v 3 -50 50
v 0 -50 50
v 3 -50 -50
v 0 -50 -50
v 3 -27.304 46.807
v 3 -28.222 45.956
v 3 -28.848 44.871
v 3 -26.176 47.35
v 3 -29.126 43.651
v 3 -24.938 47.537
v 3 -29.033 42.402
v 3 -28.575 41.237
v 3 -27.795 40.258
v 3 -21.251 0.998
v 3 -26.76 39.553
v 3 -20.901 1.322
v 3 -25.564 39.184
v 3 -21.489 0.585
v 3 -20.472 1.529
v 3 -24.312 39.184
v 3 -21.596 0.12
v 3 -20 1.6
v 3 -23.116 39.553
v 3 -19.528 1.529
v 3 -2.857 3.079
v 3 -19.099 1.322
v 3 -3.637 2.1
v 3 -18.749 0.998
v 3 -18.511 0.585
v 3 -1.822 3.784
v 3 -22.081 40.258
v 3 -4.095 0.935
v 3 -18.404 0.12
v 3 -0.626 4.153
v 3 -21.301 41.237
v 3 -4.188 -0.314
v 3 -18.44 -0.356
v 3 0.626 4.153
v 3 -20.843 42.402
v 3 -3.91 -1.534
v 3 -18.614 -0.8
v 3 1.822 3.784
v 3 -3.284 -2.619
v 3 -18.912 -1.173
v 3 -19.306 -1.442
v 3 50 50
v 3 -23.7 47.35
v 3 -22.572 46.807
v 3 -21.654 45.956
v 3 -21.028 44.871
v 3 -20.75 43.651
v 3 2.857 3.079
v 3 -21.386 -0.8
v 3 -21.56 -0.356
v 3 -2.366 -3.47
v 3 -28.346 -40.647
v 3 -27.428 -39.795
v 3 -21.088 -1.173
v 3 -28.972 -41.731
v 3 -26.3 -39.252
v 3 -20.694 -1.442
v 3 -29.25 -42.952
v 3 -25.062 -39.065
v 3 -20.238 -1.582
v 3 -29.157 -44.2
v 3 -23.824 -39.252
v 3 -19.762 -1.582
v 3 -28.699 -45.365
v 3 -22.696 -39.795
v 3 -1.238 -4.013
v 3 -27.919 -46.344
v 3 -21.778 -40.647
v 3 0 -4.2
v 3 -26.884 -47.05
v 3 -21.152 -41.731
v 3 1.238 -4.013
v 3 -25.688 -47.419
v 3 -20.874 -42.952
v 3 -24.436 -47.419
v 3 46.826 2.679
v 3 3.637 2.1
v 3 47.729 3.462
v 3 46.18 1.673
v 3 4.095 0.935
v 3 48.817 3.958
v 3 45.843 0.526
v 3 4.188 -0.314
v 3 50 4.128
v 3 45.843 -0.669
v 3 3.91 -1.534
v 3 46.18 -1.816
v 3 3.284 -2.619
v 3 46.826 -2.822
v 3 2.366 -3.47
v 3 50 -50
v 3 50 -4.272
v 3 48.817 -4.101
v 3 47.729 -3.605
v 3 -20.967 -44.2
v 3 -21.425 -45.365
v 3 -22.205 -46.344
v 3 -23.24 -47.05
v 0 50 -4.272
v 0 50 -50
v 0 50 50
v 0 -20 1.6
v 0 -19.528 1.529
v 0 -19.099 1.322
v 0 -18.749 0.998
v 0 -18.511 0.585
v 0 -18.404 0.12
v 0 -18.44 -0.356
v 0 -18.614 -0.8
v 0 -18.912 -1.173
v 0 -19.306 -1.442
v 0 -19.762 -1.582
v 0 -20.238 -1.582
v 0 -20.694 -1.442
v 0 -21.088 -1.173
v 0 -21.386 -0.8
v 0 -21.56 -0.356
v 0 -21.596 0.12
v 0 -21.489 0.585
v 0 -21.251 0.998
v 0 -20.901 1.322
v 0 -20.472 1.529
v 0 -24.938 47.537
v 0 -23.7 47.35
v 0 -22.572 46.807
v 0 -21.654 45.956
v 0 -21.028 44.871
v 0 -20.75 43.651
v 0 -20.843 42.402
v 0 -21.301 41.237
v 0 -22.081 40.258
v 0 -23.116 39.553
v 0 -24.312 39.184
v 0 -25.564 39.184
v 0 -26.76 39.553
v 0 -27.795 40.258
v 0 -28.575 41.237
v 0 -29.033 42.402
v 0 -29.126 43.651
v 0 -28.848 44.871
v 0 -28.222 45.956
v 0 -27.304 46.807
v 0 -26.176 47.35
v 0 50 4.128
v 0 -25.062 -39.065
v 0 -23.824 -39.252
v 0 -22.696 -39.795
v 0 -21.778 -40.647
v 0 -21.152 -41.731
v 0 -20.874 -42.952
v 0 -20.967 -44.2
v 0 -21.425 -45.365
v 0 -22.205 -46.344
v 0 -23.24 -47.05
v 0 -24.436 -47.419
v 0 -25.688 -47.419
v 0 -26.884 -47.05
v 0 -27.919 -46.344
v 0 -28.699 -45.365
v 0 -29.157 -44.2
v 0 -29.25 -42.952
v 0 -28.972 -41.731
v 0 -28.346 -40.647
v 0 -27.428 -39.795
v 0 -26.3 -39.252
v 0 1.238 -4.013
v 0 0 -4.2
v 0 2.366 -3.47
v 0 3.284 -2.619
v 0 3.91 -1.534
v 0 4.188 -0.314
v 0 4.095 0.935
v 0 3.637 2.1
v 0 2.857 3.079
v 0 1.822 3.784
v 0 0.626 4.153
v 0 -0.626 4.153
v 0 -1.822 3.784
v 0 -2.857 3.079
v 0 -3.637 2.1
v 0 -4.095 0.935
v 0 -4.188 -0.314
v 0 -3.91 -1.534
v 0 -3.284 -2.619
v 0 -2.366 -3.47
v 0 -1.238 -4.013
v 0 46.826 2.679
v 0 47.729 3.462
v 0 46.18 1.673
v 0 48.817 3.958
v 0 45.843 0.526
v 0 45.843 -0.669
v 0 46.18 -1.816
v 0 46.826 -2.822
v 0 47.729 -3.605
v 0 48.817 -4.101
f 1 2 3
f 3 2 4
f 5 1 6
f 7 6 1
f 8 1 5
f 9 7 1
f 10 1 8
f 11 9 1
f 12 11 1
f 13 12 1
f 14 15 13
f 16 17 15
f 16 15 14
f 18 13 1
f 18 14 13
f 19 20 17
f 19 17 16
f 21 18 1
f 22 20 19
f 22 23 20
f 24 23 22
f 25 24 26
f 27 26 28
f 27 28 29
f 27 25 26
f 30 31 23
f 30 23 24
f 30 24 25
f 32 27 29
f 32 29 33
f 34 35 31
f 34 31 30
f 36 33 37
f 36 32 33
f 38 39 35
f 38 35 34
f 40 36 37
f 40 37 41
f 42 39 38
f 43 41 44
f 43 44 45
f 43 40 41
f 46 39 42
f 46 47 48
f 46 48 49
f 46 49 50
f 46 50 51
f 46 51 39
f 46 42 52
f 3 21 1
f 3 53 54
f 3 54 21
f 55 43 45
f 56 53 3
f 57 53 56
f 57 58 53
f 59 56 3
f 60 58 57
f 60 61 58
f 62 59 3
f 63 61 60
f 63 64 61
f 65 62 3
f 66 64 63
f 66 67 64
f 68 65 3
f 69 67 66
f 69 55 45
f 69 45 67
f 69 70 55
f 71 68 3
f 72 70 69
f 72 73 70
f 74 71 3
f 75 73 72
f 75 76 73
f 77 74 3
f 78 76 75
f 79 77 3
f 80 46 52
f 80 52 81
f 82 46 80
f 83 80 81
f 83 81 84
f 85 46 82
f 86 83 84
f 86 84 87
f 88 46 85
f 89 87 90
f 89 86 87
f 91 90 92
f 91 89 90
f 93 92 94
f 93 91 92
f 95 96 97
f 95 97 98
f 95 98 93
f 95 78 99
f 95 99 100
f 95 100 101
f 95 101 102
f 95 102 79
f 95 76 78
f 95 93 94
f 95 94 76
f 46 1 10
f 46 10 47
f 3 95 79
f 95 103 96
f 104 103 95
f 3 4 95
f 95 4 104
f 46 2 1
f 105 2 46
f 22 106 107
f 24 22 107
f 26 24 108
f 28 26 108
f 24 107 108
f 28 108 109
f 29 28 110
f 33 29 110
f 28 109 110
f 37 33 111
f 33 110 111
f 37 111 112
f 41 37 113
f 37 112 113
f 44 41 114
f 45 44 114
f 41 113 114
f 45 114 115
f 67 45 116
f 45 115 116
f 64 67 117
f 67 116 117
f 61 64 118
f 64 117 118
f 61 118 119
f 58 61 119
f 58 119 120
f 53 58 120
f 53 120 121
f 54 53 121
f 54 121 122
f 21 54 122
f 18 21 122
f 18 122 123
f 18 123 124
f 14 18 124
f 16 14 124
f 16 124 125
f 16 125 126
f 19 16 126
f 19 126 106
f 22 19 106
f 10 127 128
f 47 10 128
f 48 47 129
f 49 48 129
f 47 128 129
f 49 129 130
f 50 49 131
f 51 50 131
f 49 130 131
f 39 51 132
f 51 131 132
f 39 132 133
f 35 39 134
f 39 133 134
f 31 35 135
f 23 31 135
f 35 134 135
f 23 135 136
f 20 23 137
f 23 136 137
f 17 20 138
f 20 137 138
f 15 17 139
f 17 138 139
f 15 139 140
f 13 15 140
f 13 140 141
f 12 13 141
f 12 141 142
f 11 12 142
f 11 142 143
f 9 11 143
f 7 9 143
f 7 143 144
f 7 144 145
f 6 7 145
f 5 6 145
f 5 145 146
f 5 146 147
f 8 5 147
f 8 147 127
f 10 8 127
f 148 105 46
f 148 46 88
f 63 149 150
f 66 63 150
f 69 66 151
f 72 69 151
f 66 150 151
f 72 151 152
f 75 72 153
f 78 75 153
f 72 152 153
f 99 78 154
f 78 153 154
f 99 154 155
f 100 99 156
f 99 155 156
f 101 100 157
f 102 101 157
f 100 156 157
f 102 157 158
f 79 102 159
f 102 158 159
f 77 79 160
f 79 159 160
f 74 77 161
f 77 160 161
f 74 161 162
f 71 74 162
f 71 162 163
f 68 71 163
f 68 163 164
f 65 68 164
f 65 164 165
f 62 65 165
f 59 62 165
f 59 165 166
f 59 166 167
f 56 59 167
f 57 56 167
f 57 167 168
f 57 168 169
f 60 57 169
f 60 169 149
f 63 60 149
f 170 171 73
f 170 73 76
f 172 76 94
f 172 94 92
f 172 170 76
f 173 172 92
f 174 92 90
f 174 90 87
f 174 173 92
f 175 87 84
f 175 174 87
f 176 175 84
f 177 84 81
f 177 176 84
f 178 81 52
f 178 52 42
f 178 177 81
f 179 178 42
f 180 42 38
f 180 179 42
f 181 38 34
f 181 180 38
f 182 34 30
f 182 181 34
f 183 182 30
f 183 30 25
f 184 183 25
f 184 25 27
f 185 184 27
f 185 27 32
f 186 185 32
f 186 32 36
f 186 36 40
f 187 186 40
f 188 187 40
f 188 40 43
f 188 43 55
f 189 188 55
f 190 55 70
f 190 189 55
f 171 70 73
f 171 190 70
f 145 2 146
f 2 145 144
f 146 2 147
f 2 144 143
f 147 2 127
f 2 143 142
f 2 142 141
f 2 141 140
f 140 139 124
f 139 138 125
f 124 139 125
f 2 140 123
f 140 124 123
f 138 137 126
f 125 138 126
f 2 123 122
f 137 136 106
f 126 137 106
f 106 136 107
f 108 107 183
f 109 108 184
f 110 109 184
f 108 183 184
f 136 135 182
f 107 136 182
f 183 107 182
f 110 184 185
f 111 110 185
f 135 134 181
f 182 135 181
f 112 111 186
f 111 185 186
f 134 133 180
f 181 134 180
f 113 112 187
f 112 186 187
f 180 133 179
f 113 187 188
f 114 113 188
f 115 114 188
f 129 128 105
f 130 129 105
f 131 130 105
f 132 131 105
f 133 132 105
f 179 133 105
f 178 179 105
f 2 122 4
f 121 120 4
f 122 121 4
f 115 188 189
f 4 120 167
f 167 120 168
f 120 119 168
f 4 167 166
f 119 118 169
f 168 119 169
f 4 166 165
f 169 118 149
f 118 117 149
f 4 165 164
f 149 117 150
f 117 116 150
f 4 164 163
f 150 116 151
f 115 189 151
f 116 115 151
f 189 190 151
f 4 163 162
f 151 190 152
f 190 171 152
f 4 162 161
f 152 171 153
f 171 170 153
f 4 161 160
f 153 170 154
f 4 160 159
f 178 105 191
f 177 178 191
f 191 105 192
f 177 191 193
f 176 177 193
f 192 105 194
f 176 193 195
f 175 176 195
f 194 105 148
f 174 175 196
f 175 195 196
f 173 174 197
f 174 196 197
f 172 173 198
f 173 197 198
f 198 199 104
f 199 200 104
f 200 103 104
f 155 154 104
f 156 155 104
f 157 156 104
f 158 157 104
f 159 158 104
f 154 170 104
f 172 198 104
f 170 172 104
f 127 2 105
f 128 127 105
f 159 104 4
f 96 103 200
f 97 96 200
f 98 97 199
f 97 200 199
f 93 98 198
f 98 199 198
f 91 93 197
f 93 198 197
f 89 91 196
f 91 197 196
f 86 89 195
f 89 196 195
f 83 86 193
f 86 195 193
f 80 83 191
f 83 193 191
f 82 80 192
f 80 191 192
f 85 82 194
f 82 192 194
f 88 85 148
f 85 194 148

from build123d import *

# Parameters (mm, degrees)
SKETCH2_W           = 100
SKETCH2_H           = 100
SKETCH2_R           = 4.2
BOSS_EXTRUDE1_DEPTH = 3
SKETCH3_R           = 4.2
CUT_EXTRUDE1_DEPTH  = 10
SKETCH4_R           = 1.6
CUT_EXTRUDE2_DEPTH  = 10


with BuildPart() as part:
    # Sketch2 → Boss-Extrude1 (new body)
    with BuildSketch(Plane(origin=(0, 0, 0), x_dir=(0, 0, -1), z_dir=(1, 0, 0))):
        Rectangle(SKETCH2_W, SKETCH2_H)
        Circle(SKETCH2_R, mode=Mode.SUBTRACT)
    extrude(amount=BOSS_EXTRUDE1_DEPTH)

    # Sketch3 → Cut-Extrude1 (cut)
    with BuildSketch(Plane.ZY):
        with Locations((43.336976945, -24.938051834)):
            Circle(SKETCH3_R)
        with Locations((-43.265474881, -25.061897041)):
            Circle(SKETCH3_R)
        with Locations((-0.071502064, 49.999948875)):
            Circle(SKETCH3_R)
    extrude(amount=-CUT_EXTRUDE1_DEPTH, mode=Mode.SUBTRACT)

    # Sketch4 → Cut-Extrude2 (cut)
    with BuildSketch(Plane.ZY):
        with Locations((0, -20)):
            Circle(SKETCH4_R)
    extrude(amount=-CUT_EXTRUDE2_DEPTH, mode=Mode.SUBTRACT)


solid = part.part
